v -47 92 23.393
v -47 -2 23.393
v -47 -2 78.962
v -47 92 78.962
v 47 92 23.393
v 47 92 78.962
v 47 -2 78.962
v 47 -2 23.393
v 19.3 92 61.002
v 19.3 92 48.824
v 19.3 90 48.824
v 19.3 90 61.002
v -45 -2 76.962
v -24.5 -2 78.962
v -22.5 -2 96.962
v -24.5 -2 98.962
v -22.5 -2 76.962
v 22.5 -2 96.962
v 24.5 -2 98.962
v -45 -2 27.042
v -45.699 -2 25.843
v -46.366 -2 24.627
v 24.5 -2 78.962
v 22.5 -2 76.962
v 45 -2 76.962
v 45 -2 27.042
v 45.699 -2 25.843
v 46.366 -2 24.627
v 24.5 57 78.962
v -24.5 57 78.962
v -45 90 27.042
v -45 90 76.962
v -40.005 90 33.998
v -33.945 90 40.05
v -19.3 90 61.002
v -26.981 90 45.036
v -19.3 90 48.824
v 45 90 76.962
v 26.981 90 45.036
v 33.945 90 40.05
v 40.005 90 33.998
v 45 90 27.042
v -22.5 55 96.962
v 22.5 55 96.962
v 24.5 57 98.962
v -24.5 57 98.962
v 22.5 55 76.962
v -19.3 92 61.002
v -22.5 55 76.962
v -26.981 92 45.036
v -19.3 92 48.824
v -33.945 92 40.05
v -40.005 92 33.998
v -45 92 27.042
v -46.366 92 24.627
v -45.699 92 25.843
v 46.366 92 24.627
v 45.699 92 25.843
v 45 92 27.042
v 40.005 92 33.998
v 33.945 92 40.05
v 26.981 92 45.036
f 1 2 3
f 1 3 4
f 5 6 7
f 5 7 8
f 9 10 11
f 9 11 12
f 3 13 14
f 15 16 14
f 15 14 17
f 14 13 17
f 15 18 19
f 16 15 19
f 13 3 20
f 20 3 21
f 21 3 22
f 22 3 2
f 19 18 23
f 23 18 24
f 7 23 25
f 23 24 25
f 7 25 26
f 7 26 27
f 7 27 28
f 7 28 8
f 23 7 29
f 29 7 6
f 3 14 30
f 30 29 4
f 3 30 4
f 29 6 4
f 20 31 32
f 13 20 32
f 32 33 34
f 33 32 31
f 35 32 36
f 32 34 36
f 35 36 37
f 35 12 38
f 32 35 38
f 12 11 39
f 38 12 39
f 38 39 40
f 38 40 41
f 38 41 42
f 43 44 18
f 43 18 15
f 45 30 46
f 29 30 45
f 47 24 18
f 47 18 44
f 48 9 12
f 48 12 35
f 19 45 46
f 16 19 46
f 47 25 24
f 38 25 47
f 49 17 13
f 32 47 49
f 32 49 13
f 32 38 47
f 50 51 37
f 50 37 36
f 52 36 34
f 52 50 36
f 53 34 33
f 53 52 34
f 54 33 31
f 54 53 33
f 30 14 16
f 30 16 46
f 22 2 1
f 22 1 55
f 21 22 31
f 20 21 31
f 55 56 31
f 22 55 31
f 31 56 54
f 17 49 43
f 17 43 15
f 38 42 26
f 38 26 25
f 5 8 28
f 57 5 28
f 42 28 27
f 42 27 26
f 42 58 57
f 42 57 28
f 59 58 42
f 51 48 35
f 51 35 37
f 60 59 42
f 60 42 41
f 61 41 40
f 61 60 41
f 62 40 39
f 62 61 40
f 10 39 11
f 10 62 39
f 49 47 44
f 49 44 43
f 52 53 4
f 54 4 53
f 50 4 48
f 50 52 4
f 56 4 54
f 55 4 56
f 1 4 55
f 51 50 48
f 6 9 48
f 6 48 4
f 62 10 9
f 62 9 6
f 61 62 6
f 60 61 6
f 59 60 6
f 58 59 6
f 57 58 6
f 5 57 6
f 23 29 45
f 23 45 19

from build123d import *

# Parameters (mm, degrees)
BOSS_EXTRU_1_START = -10
BOSS_EXTRU_1_DEPTH = 2
BOSS_EXTRU_2_START = -12
BOSS_EXTRU_2_DEPTH = 20
BOSS_EXTRU_3_START = -32
ESQUISSE3_4_W      = 45
ESQUISSE3_4_H      = 57
BOSS_EXTRU_3_DEPTH = 2
BOSS_EXTRU_4_DEPTH = 2
BOSS_EXTRU_5_DEPTH = 94


with BuildPart() as part:
    # Esquisse3 → Boss.-Extru.1 (new body)
    with BuildSketch(Plane(origin=(0, 0, 66.961524227), x_dir=(-1, 0, 0), z_dir=(0, 0, -1)).offset(BOSS_EXTRU_1_START)):
        Polygon((47, -2), (47, 92), (-47, 92), (-47, -2), (-24.5, -2), (-24.5, 57), (24.5, 57), (24.5, -2), align=None)
        Polygon((22.5, -2), (24.5, -2), (24.5, 57), (-24.5, 57), (-24.5, -2), (-22.5, -2), (-22.5, 55), (22.5, 55), align=None)
    extrude(amount=-BOSS_EXTRU_1_DEPTH)

    # Esquisse3<3> → Boss.-Extru.2 (add)
    with BuildSketch(Plane(origin=(0, 0, 66.961524227), x_dir=(-1, 0, 0), z_dir=(0, 0, -1)).offset(BOSS_EXTRU_2_START)):
        Polygon((22.5, -2), (24.5, -2), (24.5, 57), (-24.5, 57), (-24.5, -2), (-22.5, -2), (-22.5, 55), (22.5, 55), align=None)
    extrude(amount=-BOSS_EXTRU_2_DEPTH)

    # Esquisse3<4> → Boss.-Extru.3 (add)
    with BuildSketch(Plane(origin=(0, 0, 66.961524227), x_dir=(-1, 0, 0), z_dir=(0, 0, -1)).offset(BOSS_EXTRU_3_START)):
        with Locations((0, 26.5)):
            Rectangle(ESQUISSE3_4_W, ESQUISSE3_4_H)
    extrude(amount=BOSS_EXTRU_3_DEPTH)

    # Esquisse4 → Boss.-Extru.4 (add)
    with BuildSketch(Plane(origin=(0, 92, 0), x_dir=(1, 0, 0), z_dir=(0, 1, 0))):
        with BuildLine():
            Line((-45, -27.041634566), (-45, -76.961524227))
            Line((-45, -76.961524227), (45, -76.961524227))
            Line((45, -76.961524227), (45, -27.041634566))
            ThreePointArc((45, -27.041634566), (33.944628417, -40.050121119), (19.3, -48.823764705))
            Line((19.3, -48.823764705), (19.3, -61.001524227))
            Line((19.3, -61.001524227), (-19.3, -61.001524227))
            Line((-19.3, -61.001524227), (-19.3, -48.823764705))
            ThreePointArc((-19.3, -48.823764705), (-33.944628417, -40.050121119), (-45, -27.041634566))
        make_face()
    extrude(amount=-BOSS_EXTRU_4_DEPTH)

    # Esquisse4<3> → Boss.-Extru.5 (add)
    with BuildSketch(Plane(origin=(0, 92, 0), x_dir=(1, 0, 0), z_dir=(0, 1, 0))):
        with BuildLine():
            Line((45, -27.041634566), (45, -76.961524227))
            Line((45, -76.961524227), (47, -76.961524227))
            Line((47, -76.961524227), (47, -23.393375131))
            ThreePointArc((47, -23.393375131), (46.036153719, -25.237324557), (45, -27.041634566))
        make_face()
        with BuildLine():
            ThreePointArc((-47, -23.393375131), (-46.036153719, -25.237324557), (-45, -27.041634566))
            Line((-45, -27.041634566), (-45, -76.961524227))
            Line((-45, -76.961524227), (-47, -76.961524227))
            Line((-47, -76.961524227), (-47, -23.393375131))
        make_face()
    extrude(amount=-BOSS_EXTRU_5_DEPTH)


solid = part.part
